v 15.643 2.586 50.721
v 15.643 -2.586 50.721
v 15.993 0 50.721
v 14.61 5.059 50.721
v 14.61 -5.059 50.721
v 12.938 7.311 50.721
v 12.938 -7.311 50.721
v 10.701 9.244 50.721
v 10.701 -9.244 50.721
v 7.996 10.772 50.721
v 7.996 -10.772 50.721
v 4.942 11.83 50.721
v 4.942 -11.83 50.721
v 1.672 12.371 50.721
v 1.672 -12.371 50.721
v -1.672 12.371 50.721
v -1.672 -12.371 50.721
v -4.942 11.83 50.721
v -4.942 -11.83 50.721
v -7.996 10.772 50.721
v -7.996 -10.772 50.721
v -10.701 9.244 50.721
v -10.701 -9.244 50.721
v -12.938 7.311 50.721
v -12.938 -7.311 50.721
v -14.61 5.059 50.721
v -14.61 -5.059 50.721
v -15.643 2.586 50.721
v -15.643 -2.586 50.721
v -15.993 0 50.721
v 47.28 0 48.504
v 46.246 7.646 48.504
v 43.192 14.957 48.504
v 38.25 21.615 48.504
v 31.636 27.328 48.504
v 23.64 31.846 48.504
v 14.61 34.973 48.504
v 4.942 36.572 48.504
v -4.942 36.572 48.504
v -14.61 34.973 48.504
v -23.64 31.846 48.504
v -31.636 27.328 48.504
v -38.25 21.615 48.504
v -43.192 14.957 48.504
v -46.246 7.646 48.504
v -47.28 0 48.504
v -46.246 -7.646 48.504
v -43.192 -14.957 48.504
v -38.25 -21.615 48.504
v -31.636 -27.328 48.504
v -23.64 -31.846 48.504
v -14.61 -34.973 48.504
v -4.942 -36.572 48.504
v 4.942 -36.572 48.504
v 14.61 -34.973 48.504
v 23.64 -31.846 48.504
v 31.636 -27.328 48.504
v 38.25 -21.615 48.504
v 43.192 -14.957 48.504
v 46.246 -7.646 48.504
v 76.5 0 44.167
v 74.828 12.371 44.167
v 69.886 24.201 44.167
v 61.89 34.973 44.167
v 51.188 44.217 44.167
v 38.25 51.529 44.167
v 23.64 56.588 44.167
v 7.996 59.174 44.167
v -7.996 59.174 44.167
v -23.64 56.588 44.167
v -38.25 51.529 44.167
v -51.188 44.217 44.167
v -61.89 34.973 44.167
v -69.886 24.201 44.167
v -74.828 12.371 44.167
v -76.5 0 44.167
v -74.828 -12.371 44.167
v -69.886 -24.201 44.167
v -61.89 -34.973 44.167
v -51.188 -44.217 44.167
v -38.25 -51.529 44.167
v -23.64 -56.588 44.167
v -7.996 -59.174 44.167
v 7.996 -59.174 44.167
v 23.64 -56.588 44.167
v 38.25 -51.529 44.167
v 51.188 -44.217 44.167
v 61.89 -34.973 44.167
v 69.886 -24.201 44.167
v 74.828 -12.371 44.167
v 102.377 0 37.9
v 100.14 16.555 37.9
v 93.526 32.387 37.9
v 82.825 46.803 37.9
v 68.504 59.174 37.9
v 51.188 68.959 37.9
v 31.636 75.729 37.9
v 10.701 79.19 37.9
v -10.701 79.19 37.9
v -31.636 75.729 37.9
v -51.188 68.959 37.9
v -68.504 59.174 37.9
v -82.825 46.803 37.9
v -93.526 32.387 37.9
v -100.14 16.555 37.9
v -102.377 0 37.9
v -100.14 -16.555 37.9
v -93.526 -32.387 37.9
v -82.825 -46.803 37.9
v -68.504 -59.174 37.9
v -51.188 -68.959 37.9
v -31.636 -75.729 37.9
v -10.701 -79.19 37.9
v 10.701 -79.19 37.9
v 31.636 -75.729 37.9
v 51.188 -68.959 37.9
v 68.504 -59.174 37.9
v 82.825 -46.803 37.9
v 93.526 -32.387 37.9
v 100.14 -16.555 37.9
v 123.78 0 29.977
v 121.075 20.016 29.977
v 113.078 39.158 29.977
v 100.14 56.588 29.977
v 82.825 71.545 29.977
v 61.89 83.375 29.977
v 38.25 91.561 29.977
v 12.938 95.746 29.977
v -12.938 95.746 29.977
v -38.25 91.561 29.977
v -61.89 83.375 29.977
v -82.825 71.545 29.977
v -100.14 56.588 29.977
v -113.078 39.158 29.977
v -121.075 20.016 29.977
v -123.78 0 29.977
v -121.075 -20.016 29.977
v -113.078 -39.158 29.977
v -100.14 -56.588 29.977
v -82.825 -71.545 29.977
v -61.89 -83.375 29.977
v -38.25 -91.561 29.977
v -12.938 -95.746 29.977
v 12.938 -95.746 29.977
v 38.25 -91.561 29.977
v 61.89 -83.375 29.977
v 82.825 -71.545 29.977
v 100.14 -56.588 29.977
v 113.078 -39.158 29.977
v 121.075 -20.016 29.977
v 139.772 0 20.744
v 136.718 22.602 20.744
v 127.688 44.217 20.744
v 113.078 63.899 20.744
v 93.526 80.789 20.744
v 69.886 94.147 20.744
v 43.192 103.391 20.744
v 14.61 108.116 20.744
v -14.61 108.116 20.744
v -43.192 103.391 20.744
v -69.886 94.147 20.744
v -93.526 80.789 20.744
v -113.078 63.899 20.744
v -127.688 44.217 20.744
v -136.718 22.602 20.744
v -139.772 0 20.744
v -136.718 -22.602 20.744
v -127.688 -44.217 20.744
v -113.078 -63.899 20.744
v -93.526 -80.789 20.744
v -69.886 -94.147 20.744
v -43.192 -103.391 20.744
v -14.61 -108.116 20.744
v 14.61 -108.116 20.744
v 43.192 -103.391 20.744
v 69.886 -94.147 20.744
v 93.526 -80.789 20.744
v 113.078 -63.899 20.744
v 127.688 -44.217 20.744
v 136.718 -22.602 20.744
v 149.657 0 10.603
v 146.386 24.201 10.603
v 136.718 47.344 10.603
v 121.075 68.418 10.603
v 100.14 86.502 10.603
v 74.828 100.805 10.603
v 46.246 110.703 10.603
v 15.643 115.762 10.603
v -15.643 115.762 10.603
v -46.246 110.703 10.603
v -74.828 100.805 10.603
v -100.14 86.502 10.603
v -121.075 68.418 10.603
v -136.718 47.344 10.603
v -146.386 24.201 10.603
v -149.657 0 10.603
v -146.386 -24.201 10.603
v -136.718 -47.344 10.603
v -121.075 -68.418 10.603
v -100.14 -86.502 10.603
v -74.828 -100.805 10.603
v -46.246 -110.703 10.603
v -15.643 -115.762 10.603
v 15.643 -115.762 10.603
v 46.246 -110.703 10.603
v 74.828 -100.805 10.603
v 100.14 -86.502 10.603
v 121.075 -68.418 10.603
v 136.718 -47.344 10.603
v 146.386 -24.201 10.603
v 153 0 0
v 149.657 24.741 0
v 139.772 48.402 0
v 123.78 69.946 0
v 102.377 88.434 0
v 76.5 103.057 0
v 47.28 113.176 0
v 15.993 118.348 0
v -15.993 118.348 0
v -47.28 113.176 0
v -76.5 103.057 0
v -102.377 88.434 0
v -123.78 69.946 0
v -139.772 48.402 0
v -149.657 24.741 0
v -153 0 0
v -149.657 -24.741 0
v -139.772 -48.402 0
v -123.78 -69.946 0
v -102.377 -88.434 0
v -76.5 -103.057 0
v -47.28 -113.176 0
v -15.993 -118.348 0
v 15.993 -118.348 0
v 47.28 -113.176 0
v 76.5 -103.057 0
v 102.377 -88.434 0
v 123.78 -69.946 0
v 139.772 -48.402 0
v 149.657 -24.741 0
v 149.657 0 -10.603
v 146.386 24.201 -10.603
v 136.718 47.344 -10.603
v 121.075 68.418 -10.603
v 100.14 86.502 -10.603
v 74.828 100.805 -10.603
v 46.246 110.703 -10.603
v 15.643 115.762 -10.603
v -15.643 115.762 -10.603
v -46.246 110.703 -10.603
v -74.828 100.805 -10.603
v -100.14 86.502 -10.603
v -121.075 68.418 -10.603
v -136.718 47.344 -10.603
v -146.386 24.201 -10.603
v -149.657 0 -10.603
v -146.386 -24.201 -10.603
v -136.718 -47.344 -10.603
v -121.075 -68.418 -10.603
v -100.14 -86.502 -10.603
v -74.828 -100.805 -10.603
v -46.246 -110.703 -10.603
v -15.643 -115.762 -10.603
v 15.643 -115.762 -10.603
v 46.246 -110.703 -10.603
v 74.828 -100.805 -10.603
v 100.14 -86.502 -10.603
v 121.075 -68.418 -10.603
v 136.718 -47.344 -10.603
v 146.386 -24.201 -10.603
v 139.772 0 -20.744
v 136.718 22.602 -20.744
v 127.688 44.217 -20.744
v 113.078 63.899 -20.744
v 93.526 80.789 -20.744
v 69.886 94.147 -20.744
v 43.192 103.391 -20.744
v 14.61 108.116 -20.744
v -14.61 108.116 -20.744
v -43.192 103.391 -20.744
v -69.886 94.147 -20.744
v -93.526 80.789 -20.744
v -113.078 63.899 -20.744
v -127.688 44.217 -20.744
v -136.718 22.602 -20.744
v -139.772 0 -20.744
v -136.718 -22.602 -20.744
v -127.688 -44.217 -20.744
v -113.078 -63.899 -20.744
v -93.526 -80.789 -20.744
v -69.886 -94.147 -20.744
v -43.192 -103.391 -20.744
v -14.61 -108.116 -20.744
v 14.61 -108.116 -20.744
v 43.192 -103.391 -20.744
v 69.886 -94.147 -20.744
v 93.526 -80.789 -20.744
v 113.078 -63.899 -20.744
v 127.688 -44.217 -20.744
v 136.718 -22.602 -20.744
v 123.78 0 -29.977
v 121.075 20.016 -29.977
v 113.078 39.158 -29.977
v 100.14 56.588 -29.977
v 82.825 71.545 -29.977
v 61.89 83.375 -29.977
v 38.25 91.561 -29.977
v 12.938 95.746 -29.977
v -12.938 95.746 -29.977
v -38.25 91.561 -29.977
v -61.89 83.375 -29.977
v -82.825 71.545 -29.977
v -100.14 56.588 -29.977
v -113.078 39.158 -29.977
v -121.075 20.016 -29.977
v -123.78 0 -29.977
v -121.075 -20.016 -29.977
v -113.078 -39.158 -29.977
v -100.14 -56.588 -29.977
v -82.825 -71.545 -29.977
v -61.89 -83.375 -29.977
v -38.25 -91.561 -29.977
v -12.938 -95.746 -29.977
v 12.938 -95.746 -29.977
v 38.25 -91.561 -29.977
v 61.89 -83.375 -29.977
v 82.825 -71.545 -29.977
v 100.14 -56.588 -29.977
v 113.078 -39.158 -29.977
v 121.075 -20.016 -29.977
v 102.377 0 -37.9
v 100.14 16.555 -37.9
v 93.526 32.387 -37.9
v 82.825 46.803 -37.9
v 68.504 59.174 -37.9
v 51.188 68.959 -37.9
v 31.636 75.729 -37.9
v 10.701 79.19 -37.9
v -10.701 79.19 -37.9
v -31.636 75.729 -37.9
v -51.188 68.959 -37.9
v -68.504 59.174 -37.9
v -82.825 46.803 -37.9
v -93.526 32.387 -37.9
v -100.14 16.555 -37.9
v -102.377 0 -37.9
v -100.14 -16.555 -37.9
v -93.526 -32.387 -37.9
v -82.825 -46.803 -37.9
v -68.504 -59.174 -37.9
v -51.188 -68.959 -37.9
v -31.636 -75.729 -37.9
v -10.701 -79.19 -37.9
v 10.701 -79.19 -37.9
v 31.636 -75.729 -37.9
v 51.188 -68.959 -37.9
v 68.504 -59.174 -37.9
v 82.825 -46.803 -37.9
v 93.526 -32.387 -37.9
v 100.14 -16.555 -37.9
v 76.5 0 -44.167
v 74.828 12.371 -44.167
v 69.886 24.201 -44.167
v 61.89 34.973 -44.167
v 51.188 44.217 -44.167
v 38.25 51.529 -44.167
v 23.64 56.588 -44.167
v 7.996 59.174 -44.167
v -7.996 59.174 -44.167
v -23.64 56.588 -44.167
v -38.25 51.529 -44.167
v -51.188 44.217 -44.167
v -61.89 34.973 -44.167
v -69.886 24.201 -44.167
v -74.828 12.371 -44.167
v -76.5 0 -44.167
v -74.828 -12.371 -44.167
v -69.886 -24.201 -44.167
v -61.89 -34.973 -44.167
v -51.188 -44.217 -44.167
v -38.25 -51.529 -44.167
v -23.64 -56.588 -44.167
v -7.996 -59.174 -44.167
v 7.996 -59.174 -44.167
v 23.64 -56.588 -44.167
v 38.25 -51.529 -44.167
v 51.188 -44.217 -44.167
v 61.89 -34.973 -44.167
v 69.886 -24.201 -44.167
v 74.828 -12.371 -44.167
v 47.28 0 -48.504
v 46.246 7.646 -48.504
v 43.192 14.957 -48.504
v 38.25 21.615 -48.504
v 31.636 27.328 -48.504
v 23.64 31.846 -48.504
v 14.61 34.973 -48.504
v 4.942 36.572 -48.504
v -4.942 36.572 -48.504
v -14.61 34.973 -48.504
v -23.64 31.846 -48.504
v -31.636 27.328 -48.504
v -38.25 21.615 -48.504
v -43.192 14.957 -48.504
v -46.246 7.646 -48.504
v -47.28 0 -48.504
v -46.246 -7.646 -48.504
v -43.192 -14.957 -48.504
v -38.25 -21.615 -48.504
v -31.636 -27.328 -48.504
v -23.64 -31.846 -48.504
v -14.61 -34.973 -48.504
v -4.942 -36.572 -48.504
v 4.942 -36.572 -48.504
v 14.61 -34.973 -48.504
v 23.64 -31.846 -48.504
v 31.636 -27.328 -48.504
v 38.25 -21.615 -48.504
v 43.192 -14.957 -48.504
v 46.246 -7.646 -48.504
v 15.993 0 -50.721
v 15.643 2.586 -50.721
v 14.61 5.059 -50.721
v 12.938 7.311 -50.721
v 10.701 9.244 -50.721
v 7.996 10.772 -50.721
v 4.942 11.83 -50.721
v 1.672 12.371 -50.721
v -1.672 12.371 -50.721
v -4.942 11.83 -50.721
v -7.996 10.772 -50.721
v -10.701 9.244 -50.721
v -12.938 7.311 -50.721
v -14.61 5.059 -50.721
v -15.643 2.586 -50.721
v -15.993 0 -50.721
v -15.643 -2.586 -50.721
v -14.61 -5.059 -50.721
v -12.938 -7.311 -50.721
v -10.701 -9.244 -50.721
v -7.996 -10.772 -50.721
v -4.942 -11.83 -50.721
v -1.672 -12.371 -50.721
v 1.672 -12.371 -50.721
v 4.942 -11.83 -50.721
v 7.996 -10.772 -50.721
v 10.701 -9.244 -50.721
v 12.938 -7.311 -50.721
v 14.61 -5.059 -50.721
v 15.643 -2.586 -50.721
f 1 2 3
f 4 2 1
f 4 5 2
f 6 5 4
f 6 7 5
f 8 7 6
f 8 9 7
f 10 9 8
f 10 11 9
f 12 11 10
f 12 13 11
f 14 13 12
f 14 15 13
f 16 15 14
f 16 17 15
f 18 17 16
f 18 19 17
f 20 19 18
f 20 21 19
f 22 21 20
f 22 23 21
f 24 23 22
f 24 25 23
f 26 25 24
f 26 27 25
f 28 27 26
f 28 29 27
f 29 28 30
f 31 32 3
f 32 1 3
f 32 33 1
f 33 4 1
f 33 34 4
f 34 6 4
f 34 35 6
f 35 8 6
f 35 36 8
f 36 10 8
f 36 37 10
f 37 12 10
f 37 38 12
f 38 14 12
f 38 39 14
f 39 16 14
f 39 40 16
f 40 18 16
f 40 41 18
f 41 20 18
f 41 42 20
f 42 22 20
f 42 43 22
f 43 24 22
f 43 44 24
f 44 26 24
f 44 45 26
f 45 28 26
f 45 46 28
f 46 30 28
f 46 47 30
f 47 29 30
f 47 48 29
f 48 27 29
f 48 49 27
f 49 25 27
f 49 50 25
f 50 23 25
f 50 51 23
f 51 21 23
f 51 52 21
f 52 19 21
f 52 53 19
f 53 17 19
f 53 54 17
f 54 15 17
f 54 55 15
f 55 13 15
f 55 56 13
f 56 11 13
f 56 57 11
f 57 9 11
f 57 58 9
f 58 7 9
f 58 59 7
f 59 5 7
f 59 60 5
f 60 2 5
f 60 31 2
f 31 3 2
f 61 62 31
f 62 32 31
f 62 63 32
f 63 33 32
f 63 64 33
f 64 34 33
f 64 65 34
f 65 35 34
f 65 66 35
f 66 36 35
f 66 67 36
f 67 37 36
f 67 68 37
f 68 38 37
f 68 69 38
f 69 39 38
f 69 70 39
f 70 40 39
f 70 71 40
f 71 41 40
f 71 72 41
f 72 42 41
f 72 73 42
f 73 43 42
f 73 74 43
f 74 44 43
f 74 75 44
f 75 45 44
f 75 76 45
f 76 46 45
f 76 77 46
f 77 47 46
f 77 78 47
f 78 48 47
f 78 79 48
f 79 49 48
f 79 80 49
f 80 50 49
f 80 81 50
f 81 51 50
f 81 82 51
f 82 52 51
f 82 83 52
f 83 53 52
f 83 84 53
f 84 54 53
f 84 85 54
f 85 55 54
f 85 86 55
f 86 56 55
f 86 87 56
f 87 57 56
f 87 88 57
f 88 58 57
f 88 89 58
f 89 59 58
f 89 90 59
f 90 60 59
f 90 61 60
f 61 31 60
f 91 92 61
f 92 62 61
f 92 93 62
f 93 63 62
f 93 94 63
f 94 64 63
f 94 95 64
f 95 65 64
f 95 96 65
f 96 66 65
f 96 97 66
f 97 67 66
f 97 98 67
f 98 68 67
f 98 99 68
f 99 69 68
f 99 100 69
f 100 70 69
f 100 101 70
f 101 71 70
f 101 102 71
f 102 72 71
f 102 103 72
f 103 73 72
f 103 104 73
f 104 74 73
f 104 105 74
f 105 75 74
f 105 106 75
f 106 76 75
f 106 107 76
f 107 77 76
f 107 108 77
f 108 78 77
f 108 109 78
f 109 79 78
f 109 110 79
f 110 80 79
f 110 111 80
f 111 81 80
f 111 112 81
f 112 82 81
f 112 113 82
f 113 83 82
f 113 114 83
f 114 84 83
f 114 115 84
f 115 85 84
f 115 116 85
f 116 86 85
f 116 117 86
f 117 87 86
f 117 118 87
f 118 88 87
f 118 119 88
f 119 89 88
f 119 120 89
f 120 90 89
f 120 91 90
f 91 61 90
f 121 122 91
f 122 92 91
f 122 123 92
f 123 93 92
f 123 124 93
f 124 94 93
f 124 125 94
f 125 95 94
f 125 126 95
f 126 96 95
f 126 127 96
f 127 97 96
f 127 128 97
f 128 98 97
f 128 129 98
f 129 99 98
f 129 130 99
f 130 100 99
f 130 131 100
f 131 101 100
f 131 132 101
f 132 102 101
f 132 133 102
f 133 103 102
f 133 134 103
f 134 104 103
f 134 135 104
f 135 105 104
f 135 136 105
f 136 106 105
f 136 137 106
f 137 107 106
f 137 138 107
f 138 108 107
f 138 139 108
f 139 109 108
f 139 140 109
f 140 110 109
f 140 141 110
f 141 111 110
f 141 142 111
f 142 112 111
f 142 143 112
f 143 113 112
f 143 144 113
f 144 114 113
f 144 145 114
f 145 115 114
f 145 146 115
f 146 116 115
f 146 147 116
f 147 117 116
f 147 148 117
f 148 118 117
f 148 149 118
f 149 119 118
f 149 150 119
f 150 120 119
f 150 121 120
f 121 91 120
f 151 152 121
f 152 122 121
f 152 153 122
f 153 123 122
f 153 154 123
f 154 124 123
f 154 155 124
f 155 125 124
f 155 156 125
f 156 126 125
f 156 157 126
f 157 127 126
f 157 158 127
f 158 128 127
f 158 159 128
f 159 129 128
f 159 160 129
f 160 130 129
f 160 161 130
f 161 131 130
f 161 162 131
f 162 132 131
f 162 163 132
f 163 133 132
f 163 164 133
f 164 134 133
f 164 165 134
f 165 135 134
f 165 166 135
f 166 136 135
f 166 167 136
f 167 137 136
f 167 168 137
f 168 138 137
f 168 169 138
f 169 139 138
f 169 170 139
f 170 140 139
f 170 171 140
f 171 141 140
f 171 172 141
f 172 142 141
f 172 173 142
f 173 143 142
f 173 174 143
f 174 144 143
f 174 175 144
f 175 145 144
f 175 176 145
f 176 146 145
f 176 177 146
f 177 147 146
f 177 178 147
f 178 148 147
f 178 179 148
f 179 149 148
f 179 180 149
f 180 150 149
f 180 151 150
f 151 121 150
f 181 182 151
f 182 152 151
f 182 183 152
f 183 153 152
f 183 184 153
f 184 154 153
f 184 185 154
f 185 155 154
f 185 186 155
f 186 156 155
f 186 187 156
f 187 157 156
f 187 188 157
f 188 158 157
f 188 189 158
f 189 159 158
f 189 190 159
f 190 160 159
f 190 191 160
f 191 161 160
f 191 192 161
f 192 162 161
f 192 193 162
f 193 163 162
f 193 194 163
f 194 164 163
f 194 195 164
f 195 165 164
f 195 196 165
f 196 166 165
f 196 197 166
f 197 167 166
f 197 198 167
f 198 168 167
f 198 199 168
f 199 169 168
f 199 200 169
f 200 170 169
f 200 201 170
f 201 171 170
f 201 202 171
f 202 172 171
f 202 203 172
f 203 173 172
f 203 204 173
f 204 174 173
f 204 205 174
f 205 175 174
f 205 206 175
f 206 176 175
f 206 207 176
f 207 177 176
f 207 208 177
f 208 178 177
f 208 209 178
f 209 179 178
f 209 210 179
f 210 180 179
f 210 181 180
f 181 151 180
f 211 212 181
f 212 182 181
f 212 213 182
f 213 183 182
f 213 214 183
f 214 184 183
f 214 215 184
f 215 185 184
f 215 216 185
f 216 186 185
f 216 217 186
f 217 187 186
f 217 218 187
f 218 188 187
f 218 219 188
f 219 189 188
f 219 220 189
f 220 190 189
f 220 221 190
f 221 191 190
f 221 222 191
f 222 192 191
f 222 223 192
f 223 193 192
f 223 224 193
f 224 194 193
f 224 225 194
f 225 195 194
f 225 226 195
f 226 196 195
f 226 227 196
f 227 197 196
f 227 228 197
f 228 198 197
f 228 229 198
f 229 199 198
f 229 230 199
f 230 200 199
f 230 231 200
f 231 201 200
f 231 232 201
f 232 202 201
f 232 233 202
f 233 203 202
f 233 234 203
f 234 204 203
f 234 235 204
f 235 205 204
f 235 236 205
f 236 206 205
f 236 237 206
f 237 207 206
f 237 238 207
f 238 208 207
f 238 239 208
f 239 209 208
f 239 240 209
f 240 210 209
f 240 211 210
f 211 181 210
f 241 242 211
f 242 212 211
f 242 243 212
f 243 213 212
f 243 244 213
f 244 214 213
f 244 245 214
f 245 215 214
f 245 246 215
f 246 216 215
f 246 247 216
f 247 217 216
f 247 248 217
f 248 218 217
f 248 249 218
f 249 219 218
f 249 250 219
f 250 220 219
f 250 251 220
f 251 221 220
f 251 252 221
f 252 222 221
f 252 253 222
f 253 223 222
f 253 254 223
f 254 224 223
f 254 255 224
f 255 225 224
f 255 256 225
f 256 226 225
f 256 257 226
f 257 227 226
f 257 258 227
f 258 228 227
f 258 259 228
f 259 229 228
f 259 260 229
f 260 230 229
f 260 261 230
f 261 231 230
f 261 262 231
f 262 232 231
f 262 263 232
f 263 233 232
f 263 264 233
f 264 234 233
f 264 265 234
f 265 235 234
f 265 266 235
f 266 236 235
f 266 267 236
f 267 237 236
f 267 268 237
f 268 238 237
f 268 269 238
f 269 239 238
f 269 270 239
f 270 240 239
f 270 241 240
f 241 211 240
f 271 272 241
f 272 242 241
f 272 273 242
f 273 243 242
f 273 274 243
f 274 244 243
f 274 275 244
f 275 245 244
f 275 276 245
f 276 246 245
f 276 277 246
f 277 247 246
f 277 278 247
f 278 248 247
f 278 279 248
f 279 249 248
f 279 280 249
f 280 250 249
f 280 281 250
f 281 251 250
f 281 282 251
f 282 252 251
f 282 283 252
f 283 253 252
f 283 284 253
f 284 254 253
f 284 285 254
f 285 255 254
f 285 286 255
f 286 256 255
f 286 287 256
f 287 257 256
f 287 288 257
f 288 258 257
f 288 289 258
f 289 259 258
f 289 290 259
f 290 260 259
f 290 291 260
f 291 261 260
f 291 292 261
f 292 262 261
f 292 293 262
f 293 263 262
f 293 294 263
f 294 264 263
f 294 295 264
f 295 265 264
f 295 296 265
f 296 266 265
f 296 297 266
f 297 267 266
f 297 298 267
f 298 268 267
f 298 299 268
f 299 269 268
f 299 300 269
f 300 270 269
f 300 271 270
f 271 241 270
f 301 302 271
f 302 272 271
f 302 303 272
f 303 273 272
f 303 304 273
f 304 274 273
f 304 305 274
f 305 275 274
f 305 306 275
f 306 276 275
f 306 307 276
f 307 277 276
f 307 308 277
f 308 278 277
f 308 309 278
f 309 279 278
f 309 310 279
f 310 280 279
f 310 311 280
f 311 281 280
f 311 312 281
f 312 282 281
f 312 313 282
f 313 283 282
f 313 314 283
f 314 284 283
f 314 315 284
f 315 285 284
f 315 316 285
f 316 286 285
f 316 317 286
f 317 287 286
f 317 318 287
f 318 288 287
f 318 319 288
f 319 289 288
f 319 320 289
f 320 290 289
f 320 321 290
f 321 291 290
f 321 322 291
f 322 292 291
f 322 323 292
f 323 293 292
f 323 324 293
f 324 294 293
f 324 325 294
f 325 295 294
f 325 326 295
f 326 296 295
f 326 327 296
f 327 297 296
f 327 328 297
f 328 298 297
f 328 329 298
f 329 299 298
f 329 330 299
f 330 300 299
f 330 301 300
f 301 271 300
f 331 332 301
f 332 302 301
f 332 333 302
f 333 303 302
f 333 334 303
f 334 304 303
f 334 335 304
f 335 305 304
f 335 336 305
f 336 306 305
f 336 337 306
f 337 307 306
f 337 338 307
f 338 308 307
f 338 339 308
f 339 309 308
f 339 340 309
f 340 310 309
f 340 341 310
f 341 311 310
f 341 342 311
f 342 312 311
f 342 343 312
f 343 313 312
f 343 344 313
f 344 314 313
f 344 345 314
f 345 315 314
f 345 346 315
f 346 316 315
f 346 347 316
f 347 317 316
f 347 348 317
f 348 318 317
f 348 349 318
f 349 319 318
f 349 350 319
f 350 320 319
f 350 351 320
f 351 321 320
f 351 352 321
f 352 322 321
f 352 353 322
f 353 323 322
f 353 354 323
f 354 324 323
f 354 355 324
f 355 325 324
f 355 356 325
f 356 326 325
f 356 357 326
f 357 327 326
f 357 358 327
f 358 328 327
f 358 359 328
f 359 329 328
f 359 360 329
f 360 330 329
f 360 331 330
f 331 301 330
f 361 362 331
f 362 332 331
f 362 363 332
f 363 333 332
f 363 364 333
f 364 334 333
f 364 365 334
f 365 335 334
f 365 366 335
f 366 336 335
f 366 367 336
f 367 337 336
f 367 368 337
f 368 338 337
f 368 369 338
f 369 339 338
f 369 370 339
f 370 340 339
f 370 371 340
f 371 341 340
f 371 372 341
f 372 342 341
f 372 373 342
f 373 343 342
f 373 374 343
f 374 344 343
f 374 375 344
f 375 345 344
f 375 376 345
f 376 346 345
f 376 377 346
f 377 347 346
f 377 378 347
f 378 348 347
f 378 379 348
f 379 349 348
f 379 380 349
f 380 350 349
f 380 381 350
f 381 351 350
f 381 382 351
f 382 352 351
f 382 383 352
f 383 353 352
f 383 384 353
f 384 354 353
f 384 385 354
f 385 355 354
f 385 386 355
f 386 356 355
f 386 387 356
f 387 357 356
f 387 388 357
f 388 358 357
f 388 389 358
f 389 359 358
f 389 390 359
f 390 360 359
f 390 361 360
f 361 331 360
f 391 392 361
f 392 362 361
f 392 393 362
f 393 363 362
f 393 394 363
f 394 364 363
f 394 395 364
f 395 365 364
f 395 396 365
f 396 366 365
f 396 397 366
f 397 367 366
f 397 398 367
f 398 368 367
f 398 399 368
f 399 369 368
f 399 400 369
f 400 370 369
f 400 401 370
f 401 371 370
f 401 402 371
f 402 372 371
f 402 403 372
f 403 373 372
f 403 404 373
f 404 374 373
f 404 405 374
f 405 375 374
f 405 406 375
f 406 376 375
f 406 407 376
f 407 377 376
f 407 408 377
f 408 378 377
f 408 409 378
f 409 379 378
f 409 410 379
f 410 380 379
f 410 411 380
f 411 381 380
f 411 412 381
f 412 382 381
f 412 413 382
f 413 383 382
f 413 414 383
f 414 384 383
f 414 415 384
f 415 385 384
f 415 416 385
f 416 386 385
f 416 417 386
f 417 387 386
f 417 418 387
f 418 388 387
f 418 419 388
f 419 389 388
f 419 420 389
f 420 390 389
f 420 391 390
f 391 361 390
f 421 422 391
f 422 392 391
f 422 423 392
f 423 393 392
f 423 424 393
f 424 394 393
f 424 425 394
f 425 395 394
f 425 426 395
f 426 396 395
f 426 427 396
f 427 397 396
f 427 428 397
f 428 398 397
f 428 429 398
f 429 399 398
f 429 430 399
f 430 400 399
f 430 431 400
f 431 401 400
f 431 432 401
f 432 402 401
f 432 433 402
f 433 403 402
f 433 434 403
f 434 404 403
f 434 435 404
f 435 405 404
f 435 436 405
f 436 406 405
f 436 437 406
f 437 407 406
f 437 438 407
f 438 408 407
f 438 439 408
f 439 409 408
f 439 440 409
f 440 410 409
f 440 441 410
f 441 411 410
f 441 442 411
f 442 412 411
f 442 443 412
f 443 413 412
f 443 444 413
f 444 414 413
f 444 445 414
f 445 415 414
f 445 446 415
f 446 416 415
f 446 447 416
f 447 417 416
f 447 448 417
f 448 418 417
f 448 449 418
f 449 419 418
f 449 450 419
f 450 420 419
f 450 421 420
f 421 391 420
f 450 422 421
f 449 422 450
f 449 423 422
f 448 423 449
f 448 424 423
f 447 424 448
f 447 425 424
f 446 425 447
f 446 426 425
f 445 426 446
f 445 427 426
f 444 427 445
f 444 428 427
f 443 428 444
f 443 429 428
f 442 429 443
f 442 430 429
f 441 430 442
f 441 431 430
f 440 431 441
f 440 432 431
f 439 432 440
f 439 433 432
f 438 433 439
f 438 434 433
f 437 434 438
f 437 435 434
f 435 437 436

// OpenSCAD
// Generated by SolidPython 1.0.1 on 2020-07-29 00:46:48


scale(v = [9, 7, 3]) {
	sphere(r = 17);
}
/***********************************************
*********      SolidPython code:      **********
************************************************
 
# import packages: SolidPython
from solid import *
from solid.utils import *
from itertools import chain, combinations, permutations


class Resize:

    def __init__(self, scad_file):
        self.scad_file = scad_file
        #self.scad_file = import_scad(scad_file)
        # cone/cylinder param:
        self.r1 = 0
        self.r2 = 0
        self.h = 0
        # rectangular prism param:
        self.w = 0
        self.l = 0
        # ellipse param:
        self.r = 0

    # import OpenScad code (file name corresponds to shape)


    # classify shape + parameters
    def assign(self, param1, param2, param3):
        if self.scad_file == 'cone.scad':
            self.r1 = param1
            self.r2 = param2
            self.h = param3
        elif self.scad_file == 'cylinder.scad':
            self.r1 = param1
            self.r2 = param2
            self.h = param3
        elif self.scad_file == 'rectangularPrism.scad':
            self.h = param1
            self.l = param2
            self.w = param3
        else:
            self.r = param1
            self.h = param2

    # resize parameters
    def iterate(self):
        x = range(3, 20, 2)
        i = 1
        if self.scad_file == 'cone.scad':
            tempList = list(permutations(x, 2))
            for temp in tempList:
                param1 = temp[0]
                param2 = temp[1]
                filepath = 'produced_scad_files/' + 'cone' + str(param1) + '_' + str(param2) + '_' + '.scad'
                scad_render_to_file(cylinder(h=param1, r1=param2, r2=0), filepath)

        elif self.scad_file == 'cylinder.scad':
            tempList = list(permutations(x, 3))
            for temp in tempList:
                param1 = temp[0]
                param2 = temp[1]
                filepath = 'produced_scad_files/' + 'cylinder' + str(param1) + '_' + str(param2) + '_' + '.scad'
                scad_render_to_file(cylinder(h=param1, r1=param2, r2=param2), filepath)

        elif self.scad_file == 'rectangularPrism.scad':
            tempList = list(permutations(x, 3))
            for temp in tempList:
                param1 = temp[0]
                param2 = temp[1]
                param3 = temp[2]
                filepath = 'produced_scad_files/' + 'rectangularPrism' + str(param1) + '_' + str(param2) + '_' + str(
                    param3) + '.scad'
                scad_render_to_file(cube(size=(param1, param2, param3)), filepath)

        elif self.scad_file == 'ellipse.scad':
            tempList = list(permutations(x, 4))
            for temp in tempList:
                param1 = temp[0]
                param2 = temp[1]
                param3 = temp[2]
                param4 = temp[3]
                filepath = 'produced_scad_files/' + 'ellipse' + str(param1) + '_' + str(param2) + '_' + str(param3) + '_' + str(param4) + '.scad'
                scad_render_to_file(scale([param1, param2, param3])(sphere(r=param4)), filepath)

    def render_to_scadfile(self):
        scad_render_to_file(scad, 'example.scad') 
 
************************************************/
